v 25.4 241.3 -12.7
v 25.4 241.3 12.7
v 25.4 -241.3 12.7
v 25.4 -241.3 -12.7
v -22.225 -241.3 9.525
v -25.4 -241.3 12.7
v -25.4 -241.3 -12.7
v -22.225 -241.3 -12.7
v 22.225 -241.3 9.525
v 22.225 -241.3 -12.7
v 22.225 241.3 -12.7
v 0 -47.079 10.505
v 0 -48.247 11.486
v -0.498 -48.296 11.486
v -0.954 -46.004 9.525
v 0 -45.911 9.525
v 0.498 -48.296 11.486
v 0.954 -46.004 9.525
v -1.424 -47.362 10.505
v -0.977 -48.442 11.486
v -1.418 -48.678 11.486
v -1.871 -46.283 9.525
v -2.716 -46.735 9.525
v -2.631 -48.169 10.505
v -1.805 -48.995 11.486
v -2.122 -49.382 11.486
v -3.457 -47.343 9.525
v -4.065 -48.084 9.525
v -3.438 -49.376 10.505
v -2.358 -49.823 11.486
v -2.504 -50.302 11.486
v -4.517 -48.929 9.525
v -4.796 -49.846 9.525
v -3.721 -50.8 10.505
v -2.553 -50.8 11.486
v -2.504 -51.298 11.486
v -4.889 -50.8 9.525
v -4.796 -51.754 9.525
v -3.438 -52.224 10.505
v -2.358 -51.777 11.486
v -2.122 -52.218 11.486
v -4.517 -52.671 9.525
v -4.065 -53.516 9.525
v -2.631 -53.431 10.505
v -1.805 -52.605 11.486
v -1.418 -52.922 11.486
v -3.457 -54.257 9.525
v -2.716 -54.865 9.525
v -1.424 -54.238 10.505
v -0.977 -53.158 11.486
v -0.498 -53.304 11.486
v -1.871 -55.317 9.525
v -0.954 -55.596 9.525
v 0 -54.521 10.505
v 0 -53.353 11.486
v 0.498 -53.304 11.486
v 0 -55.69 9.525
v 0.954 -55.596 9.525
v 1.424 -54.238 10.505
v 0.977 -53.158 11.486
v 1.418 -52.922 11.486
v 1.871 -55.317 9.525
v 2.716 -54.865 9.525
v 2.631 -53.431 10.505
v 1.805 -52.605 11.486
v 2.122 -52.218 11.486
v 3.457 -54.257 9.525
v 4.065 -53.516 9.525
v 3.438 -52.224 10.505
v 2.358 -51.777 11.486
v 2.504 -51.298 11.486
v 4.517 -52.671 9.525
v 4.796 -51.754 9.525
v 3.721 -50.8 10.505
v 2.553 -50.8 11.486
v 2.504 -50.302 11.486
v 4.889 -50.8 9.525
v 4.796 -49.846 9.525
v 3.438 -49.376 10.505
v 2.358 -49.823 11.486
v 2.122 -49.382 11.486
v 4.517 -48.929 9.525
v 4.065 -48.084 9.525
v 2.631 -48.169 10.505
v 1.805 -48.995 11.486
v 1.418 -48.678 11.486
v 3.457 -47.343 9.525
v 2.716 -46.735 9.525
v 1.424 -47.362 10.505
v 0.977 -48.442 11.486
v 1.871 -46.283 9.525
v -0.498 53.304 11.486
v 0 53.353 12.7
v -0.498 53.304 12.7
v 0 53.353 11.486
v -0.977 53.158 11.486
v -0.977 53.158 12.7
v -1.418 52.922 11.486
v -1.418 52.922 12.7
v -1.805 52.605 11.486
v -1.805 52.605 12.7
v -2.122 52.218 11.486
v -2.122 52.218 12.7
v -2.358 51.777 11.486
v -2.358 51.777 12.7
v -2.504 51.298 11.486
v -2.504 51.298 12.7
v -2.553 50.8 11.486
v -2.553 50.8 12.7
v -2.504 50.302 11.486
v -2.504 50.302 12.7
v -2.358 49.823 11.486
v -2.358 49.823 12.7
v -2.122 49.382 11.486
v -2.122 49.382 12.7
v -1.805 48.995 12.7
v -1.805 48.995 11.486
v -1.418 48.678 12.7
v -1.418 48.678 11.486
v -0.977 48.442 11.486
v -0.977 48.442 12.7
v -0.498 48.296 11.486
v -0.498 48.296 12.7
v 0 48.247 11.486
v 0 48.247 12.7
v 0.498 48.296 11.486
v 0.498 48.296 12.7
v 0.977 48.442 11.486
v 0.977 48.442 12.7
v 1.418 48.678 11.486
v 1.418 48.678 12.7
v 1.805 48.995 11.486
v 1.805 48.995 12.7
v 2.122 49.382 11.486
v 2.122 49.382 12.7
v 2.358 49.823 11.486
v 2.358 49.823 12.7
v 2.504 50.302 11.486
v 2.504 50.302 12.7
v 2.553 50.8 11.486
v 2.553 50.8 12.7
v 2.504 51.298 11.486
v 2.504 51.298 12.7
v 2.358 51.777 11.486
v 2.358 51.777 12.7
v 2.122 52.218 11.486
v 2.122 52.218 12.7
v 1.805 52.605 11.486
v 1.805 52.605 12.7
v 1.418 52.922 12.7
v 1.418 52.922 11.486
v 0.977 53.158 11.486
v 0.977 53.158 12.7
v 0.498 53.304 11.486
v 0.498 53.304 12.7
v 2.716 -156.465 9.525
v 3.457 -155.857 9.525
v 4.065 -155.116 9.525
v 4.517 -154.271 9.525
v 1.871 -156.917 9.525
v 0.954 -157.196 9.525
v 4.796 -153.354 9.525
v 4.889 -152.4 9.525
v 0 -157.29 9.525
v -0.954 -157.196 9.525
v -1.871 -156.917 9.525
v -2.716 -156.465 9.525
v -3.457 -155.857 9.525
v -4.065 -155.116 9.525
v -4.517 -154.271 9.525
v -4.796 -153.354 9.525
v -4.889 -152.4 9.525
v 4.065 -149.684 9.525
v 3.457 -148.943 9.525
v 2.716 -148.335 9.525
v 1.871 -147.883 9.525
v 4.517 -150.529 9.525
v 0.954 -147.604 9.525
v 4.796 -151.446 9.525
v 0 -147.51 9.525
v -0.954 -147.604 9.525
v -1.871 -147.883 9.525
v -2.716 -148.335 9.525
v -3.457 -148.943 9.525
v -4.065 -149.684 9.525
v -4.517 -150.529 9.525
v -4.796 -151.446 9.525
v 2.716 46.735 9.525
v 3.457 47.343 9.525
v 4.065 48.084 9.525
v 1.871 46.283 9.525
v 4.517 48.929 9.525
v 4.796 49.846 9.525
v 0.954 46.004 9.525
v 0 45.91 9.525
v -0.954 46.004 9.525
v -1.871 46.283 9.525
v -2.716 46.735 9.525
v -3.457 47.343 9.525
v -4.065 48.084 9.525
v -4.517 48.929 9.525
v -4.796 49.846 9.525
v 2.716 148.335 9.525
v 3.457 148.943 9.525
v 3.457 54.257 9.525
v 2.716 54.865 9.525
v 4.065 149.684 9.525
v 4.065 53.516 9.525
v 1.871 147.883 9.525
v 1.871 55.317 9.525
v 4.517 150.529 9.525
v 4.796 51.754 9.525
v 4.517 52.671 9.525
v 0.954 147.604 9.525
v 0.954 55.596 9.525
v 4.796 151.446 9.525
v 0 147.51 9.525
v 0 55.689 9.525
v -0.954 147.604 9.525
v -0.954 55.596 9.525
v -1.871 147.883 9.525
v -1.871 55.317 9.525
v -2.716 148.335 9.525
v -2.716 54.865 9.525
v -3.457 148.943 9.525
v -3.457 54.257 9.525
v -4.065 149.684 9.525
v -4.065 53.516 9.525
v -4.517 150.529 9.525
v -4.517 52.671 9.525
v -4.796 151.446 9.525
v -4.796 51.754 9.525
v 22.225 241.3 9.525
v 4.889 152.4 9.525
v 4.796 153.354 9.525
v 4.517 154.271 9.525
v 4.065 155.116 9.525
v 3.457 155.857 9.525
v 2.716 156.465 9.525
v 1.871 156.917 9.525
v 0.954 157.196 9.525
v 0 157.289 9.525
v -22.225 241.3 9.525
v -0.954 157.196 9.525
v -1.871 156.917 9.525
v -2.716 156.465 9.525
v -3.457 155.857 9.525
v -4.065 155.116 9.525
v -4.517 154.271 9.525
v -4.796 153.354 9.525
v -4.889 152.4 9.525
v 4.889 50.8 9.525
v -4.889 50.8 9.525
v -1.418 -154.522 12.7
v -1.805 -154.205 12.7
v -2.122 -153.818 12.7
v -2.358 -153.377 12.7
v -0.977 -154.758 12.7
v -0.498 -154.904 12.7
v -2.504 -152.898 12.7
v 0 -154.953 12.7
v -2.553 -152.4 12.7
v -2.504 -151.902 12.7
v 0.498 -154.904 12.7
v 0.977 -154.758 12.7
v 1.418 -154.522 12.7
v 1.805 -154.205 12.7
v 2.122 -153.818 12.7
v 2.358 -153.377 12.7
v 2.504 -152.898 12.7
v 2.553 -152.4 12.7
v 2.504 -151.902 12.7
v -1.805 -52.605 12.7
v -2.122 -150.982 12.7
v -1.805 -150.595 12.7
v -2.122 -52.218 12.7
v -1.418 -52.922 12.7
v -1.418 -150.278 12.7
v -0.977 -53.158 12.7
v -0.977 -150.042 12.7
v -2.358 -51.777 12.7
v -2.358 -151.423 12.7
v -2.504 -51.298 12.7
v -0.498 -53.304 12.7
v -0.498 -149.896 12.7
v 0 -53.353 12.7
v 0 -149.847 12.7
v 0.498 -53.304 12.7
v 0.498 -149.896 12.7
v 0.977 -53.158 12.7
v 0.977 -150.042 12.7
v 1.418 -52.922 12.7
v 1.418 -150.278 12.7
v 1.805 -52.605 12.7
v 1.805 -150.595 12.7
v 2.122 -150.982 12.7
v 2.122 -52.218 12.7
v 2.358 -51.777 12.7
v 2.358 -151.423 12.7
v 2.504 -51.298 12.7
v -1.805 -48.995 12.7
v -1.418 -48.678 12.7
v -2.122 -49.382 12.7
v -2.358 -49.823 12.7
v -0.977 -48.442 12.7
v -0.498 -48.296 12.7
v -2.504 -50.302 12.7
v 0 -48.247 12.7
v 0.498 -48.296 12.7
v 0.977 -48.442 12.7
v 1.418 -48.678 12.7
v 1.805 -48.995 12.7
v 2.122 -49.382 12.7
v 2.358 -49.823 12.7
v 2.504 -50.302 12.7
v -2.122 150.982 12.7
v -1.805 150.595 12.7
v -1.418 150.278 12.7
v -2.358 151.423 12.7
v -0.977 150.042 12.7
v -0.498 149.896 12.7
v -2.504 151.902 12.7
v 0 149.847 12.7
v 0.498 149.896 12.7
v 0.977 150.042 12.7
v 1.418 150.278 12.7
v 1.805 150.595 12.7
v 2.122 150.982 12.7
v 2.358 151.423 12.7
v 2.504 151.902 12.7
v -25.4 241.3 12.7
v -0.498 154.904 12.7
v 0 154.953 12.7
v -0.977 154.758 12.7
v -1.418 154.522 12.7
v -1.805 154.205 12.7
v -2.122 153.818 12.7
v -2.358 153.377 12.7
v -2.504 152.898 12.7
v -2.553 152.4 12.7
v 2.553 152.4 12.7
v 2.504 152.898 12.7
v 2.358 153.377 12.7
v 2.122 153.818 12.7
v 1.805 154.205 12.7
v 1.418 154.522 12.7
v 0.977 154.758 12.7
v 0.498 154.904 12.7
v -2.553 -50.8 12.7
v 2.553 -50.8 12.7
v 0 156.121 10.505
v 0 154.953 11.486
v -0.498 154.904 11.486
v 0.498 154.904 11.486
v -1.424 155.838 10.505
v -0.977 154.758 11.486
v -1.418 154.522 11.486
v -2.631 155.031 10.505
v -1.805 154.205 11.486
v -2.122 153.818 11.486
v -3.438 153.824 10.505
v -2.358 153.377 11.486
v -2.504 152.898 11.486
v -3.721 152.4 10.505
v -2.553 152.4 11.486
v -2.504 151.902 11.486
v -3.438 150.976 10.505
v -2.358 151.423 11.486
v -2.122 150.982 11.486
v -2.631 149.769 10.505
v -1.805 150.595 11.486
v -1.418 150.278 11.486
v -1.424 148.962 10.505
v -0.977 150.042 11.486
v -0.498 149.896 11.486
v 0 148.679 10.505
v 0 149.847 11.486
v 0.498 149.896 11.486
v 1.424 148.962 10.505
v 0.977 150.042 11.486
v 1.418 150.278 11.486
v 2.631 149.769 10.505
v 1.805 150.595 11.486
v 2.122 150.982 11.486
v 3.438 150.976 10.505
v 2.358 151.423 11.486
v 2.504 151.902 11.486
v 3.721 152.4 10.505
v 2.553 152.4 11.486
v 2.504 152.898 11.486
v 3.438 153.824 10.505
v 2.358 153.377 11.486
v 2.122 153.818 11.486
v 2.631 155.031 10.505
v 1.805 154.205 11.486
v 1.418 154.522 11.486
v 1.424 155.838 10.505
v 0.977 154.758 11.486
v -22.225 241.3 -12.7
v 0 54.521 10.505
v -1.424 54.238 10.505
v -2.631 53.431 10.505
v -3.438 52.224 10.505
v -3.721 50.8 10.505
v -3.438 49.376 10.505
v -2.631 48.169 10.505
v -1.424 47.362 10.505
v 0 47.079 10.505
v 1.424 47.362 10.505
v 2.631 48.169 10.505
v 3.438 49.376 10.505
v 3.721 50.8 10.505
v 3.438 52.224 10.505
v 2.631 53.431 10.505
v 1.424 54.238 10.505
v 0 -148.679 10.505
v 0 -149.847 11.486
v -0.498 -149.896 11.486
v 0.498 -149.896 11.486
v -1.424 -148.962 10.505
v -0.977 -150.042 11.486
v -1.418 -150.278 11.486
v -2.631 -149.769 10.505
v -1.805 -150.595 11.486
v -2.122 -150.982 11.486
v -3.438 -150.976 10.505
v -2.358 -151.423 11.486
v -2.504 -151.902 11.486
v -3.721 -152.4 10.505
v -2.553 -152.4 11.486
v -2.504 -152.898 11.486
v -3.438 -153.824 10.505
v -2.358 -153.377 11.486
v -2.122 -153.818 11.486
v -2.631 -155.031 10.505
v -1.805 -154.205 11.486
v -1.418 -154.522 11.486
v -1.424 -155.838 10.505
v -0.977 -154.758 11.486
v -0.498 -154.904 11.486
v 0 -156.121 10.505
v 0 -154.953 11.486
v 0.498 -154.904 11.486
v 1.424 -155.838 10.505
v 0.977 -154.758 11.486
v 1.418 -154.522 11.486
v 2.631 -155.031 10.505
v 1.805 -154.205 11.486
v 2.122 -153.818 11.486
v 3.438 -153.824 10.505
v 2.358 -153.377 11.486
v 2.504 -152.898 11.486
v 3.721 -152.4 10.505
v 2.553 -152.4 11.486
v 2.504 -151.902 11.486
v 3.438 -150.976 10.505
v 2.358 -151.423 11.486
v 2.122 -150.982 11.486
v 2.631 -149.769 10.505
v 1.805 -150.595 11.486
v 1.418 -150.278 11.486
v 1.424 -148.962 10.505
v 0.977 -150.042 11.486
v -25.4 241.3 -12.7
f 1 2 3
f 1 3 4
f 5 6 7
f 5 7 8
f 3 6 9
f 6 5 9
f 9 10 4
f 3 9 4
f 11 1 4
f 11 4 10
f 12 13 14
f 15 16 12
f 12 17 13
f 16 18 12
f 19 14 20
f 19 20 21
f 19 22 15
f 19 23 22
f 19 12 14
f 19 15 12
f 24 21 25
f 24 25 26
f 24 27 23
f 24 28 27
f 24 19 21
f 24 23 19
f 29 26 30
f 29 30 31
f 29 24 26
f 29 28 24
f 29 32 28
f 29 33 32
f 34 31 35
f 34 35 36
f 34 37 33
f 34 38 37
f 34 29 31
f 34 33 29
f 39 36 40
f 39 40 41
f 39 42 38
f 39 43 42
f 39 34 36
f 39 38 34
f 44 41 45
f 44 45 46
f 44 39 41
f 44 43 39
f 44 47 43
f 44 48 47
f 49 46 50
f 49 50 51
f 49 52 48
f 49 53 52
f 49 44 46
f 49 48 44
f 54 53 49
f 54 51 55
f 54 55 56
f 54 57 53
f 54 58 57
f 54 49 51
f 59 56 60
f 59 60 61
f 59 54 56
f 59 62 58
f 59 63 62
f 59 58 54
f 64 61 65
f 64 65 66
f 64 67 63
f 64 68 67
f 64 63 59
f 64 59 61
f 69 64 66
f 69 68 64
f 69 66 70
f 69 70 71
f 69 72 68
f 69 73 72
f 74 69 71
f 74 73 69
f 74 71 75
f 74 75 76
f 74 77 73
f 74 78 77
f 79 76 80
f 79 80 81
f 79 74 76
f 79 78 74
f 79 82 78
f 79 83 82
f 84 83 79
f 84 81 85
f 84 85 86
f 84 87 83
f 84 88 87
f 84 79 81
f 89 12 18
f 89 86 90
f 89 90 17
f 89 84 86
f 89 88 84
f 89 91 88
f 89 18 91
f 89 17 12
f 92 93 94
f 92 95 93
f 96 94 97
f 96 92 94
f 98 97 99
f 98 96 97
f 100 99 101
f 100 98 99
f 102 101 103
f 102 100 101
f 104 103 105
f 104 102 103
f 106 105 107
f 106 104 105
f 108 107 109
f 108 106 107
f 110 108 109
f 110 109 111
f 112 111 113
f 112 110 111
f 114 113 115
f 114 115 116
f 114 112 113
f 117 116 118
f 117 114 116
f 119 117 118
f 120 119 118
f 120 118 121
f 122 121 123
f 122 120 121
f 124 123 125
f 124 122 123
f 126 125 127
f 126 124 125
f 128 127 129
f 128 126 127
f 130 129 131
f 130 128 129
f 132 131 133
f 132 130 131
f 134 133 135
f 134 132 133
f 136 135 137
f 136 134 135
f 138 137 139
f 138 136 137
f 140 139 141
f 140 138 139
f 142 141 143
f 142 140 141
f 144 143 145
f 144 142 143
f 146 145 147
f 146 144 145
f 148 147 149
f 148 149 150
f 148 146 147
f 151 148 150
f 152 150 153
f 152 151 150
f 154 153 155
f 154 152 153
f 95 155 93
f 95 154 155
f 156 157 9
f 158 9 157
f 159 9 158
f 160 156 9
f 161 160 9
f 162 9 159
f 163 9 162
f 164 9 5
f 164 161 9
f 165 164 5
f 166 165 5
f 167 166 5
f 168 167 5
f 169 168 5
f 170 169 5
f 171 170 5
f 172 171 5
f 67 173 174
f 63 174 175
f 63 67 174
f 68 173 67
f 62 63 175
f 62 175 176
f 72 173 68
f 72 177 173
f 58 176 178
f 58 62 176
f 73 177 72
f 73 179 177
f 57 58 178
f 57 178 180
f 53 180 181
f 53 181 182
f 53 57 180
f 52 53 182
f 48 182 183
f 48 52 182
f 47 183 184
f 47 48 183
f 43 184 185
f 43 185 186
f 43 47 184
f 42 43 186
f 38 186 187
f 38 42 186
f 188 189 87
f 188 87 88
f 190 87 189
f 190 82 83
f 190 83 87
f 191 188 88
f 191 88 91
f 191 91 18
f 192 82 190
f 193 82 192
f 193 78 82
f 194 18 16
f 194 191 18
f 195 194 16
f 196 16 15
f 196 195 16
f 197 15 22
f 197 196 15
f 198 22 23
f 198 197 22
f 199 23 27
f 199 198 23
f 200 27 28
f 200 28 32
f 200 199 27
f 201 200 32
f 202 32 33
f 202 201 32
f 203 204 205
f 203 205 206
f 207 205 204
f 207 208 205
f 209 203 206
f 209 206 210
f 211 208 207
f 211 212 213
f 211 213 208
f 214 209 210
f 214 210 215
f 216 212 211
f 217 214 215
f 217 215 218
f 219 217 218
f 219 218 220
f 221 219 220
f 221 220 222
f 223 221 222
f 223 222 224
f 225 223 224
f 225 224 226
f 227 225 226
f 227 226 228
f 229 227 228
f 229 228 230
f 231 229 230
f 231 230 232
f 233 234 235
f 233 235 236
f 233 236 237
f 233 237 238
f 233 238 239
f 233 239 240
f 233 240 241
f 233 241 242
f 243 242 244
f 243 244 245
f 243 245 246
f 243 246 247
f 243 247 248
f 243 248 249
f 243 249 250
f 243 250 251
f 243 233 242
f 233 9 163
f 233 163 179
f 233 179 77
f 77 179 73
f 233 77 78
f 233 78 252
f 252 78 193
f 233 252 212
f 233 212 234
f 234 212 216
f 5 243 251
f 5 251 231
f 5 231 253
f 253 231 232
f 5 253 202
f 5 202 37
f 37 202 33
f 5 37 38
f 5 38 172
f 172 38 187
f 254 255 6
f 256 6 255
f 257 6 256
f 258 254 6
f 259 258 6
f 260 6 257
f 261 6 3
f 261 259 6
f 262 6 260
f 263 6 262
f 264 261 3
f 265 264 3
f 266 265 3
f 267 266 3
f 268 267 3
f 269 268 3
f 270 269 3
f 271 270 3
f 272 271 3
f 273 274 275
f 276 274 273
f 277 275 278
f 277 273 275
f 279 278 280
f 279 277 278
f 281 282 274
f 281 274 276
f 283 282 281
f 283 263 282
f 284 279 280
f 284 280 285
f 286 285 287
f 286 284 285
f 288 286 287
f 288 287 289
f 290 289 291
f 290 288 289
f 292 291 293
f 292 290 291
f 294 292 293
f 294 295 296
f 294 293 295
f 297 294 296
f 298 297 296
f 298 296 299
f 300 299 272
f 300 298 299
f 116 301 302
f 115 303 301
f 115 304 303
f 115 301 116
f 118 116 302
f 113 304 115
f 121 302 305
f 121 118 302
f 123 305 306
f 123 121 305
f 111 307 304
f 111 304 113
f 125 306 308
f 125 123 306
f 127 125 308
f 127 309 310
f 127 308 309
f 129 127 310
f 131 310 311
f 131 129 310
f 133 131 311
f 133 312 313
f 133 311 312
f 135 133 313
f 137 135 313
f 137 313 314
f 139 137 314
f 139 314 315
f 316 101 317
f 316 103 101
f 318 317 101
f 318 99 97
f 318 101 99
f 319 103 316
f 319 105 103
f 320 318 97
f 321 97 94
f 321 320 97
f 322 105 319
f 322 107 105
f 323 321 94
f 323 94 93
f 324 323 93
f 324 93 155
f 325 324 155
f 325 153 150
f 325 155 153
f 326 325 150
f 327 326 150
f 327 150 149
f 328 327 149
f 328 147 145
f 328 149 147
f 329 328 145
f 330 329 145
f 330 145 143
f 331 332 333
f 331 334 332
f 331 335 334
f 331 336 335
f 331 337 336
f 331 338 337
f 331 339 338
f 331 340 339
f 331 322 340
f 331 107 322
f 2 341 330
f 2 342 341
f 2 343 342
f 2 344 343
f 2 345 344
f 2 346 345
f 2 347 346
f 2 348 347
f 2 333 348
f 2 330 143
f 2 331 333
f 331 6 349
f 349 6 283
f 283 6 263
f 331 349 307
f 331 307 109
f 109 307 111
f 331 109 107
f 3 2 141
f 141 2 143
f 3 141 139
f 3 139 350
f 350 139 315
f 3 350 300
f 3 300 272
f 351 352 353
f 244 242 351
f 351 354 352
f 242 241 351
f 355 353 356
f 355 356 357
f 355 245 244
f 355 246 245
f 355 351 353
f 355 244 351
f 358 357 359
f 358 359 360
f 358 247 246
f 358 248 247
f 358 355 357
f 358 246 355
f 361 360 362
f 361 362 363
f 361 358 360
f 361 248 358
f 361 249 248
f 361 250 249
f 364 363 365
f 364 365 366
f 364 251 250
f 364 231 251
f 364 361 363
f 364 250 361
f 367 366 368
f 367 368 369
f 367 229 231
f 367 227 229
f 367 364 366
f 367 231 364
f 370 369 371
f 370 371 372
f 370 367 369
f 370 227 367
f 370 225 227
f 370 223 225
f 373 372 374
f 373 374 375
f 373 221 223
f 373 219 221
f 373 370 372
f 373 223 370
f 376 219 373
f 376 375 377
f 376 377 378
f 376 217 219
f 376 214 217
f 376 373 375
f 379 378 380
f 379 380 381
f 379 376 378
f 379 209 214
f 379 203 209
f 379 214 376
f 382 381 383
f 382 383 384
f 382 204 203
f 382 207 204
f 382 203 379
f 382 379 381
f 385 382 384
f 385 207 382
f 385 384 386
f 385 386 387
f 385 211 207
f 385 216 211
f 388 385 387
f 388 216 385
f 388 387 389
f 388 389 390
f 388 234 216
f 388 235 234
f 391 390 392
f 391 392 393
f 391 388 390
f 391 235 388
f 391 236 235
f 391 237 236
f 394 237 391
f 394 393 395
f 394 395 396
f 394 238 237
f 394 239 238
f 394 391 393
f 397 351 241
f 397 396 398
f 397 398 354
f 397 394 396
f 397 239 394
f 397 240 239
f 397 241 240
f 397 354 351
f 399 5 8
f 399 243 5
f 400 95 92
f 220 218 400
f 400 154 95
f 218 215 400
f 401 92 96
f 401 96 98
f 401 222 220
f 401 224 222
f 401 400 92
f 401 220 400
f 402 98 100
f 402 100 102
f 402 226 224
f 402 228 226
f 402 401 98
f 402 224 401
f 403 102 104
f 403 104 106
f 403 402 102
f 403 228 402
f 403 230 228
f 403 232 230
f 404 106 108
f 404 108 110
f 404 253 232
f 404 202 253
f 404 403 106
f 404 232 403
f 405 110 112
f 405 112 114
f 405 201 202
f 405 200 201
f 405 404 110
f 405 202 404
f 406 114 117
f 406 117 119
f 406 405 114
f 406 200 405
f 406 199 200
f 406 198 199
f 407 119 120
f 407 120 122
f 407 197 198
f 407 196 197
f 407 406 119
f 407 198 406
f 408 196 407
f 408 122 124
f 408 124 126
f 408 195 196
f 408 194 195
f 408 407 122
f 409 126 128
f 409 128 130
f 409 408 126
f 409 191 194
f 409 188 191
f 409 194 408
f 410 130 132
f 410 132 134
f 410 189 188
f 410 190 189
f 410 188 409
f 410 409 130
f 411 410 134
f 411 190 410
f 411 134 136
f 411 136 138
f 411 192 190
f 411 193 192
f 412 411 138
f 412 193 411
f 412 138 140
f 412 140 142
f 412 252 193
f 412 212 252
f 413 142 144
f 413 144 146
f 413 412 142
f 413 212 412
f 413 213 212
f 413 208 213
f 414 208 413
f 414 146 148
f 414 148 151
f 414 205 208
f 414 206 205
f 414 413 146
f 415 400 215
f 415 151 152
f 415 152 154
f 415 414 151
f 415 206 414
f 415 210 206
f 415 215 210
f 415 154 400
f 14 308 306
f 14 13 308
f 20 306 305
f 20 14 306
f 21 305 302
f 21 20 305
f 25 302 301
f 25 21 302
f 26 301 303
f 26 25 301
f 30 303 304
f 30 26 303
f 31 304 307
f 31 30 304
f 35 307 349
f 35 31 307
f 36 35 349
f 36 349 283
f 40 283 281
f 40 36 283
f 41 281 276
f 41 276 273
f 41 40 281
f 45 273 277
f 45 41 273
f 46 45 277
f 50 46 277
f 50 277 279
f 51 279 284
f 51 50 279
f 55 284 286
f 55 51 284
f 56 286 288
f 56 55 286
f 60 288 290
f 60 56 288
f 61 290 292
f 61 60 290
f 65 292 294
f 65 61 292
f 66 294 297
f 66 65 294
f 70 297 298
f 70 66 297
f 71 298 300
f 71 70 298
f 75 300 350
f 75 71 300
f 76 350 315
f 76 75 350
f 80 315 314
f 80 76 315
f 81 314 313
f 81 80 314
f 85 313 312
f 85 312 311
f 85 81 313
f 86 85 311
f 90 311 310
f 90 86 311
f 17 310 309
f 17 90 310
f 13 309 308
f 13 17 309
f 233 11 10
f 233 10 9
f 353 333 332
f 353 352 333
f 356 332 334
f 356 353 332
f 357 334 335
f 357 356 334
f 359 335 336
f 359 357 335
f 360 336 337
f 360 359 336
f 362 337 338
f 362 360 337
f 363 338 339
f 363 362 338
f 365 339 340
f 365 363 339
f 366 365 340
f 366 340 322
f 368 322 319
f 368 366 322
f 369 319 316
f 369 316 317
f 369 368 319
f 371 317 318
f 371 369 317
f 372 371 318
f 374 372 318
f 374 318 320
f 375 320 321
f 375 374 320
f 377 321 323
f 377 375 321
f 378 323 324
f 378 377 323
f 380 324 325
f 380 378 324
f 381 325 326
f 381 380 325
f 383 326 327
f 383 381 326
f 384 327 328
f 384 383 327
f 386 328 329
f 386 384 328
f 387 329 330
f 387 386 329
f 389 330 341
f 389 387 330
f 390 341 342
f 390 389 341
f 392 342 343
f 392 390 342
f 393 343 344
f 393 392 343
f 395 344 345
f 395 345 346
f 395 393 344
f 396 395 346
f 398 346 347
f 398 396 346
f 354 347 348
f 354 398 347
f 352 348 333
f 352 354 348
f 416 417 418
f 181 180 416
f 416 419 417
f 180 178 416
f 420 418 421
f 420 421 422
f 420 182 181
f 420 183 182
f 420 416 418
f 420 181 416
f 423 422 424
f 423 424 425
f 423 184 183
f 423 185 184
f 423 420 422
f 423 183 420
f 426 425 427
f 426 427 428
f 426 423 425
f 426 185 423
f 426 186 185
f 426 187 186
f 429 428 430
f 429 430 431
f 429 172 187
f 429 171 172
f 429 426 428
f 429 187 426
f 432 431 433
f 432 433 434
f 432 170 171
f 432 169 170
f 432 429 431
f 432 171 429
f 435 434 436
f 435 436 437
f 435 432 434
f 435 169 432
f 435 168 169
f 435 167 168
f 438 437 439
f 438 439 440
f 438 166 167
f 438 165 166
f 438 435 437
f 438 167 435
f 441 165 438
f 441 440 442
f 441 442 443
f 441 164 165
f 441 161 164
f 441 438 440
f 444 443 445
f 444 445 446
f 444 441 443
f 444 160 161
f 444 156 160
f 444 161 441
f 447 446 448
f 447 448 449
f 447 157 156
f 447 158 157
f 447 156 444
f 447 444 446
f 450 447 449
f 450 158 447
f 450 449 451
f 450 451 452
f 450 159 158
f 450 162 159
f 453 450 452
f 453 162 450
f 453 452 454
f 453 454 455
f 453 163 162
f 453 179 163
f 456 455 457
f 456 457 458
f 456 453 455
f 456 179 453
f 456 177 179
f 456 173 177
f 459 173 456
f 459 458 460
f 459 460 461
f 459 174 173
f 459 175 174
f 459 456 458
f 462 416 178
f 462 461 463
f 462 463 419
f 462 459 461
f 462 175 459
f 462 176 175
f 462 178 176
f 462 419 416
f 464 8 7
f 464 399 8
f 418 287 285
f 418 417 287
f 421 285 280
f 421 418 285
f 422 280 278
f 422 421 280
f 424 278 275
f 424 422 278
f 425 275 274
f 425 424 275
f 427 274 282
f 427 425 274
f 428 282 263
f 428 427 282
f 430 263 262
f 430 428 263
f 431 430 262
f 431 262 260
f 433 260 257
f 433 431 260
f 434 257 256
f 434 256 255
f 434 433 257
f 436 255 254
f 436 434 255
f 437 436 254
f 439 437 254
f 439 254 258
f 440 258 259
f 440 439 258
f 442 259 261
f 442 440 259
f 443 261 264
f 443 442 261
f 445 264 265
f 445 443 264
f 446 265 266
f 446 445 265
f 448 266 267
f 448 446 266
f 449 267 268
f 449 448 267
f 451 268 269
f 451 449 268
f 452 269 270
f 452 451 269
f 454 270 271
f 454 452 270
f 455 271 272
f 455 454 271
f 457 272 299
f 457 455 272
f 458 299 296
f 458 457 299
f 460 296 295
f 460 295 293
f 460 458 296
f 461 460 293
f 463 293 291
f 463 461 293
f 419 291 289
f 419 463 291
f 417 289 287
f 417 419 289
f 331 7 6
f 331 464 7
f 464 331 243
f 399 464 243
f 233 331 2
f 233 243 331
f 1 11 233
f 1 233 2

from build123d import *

# Parameters (mm, degrees)
BOSS_EXTRUDE1_DEPTH = 241.3
LPATTERN1_COUNT     = 4
LPATTERN1_PITCH     = 101.6


with BuildPart() as part:
    # Sketch1 → Boss-Extrude1 (new, symmetric)
    with BuildSketch(Plane(origin=(0, 0, 0), x_dir=(1, 0, 0), z_dir=(0, 1, 0))):
        Polygon((-25.4, 12.7), (-25.4, -12.7), (25.4, -12.7), (25.4, 12.7), (22.225, 12.7), (22.225, -9.525), (-22.225, -9.525), (-22.225, 12.7), align=None)
    extrude(amount=BOSS_EXTRUDE1_DEPTH, both=True)

    # Sketch2 → CSK for #10 Flat Head Machine Screw (100)1 (revolve, cut)
    with BuildSketch(Plane(origin=(0, -152.4, 9.525), x_dir=(0, 1, 0), z_dir=(1, 0, 0))):
        Polygon((0, 0), (0, 3.175), (2.5527, 3.175), (2.5527, 1.960808018), (4.8895, 0), align=None)
    csk_for_10_flat_head_machine_screw_100 = revolve(axis=Axis((0, -152.4, 3.175), (0, 0, 1)), mode=Mode.SUBTRACT)

    # LPattern1: CSK for #10 Flat Head Machine Screw (100)1 ×4
    with Locations(*[(0, i * LPATTERN1_PITCH, 0) for i in range(1, LPATTERN1_COUNT)]):
        add(csk_for_10_flat_head_machine_screw_100, mode=Mode.SUBTRACT)


solid = part.part
